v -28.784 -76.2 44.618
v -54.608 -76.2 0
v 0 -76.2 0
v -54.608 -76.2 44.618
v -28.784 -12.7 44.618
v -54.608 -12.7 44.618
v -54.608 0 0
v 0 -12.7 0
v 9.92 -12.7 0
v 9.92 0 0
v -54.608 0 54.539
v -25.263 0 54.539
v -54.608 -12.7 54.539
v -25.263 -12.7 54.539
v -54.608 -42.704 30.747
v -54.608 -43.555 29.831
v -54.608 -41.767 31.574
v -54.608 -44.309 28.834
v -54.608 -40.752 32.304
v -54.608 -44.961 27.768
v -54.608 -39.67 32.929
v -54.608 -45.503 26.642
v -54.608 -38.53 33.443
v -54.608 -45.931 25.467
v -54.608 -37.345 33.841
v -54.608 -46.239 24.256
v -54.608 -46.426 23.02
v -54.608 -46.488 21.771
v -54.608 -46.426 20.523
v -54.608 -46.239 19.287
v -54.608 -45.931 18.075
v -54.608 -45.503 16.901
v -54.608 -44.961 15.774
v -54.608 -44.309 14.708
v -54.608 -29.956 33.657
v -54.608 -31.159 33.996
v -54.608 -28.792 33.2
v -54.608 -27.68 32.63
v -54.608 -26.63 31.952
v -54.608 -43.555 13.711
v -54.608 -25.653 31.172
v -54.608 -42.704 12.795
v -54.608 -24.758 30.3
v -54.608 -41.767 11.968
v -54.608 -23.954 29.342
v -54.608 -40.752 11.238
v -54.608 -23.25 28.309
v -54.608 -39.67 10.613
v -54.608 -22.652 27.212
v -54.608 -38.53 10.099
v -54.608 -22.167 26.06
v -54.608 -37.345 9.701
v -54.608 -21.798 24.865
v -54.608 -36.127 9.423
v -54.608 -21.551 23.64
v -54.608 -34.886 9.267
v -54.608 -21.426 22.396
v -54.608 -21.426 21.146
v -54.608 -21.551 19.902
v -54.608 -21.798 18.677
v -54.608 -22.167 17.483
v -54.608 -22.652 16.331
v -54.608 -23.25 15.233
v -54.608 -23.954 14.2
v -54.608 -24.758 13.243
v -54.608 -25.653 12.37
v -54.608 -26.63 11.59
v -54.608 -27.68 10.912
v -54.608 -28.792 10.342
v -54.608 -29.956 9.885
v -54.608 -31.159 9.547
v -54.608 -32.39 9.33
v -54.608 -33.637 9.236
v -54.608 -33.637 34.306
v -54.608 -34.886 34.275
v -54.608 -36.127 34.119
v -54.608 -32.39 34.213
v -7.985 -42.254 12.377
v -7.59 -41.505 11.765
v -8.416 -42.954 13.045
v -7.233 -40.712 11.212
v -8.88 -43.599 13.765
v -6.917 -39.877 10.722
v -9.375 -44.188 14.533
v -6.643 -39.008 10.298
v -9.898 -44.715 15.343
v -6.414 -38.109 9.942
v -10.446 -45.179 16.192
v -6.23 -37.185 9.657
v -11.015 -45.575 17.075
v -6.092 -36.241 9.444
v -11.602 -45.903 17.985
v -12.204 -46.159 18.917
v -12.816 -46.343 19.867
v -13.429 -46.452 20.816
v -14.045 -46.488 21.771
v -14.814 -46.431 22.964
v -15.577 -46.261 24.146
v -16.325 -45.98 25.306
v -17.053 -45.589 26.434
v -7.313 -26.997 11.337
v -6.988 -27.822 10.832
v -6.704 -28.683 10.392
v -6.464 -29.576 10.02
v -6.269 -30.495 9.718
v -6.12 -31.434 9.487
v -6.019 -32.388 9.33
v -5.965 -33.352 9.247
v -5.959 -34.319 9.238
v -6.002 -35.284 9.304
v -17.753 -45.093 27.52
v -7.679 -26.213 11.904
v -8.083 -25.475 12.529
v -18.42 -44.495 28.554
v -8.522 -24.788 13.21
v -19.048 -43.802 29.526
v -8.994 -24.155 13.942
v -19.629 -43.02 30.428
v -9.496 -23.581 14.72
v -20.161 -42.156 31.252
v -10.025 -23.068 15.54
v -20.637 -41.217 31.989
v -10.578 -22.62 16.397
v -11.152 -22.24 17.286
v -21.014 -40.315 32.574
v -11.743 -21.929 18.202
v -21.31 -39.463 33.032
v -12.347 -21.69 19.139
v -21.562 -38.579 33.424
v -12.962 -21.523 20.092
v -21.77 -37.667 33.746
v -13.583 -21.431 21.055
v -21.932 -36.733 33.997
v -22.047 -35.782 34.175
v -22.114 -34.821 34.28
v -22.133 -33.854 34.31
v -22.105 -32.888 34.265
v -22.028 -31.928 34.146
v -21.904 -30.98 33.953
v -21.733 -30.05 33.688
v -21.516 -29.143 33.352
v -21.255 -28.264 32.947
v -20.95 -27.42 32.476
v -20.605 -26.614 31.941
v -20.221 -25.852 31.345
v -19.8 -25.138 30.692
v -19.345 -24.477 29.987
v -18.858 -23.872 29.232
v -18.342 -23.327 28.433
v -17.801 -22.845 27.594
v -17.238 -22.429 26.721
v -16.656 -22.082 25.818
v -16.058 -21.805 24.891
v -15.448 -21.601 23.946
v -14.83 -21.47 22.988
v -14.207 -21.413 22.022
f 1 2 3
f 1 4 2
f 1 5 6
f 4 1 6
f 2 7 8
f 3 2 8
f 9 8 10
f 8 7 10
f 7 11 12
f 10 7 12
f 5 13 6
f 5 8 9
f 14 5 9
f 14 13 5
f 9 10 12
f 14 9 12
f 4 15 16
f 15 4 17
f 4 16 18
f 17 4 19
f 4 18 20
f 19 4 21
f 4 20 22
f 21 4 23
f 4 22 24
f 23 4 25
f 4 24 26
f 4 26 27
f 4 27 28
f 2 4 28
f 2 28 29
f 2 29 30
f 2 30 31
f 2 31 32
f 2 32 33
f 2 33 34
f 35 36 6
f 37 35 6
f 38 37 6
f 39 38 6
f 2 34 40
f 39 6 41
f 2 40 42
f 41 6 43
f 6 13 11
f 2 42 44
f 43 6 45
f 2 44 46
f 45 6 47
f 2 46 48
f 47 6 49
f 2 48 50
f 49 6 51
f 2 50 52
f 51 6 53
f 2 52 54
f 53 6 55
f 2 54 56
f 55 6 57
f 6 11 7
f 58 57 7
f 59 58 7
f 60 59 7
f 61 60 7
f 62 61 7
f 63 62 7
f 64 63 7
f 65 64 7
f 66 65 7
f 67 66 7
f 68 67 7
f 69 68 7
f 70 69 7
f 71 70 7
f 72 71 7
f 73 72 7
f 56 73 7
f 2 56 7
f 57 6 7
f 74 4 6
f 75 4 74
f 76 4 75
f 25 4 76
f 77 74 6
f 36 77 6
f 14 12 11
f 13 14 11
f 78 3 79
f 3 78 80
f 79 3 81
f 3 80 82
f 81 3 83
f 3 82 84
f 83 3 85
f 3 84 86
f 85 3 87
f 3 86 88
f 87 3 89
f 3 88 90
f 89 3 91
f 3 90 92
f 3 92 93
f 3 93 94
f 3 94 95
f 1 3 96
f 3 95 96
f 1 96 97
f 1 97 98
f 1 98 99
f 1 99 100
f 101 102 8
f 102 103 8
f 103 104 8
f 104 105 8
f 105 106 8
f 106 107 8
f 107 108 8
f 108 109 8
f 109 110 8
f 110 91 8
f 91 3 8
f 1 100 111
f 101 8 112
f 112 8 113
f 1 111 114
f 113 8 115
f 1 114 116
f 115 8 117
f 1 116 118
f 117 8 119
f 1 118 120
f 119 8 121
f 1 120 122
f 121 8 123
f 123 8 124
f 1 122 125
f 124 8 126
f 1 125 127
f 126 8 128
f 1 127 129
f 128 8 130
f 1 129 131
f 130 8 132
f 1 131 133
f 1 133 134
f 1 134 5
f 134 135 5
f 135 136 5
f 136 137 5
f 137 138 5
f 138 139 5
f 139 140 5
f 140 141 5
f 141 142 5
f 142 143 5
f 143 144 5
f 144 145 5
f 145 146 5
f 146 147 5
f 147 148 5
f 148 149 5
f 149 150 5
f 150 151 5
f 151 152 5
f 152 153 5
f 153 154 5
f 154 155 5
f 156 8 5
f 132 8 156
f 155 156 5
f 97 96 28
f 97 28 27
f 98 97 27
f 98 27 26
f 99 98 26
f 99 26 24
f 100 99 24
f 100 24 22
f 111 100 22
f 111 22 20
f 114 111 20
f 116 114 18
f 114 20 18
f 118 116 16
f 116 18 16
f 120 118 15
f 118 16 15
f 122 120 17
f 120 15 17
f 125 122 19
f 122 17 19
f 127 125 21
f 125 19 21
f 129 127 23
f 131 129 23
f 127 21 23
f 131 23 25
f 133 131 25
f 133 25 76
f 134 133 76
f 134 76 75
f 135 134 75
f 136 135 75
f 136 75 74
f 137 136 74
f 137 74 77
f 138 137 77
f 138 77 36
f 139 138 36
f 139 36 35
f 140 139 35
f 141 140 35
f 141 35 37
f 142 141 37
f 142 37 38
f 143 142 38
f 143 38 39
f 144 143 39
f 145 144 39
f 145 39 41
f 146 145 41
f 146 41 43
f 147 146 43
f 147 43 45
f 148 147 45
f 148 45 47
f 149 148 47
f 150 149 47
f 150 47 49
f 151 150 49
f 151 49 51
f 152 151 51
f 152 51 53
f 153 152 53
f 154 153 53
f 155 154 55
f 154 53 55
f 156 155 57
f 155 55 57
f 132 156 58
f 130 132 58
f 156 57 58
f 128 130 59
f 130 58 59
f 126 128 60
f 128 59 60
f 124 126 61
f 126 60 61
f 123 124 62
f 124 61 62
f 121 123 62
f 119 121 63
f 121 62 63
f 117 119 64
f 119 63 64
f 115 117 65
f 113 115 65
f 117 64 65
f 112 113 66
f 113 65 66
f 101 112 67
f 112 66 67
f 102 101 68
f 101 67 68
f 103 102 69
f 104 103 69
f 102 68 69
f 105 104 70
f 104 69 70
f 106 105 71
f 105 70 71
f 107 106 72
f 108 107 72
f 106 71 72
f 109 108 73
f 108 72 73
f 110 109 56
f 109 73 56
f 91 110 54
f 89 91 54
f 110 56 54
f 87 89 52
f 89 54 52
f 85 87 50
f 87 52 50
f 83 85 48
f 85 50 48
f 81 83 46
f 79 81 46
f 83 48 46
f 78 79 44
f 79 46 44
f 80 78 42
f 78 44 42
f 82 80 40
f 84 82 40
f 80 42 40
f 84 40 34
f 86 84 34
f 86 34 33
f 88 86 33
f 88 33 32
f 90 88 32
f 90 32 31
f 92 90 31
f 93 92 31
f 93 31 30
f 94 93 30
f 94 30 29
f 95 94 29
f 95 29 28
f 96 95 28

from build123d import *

# Parameters (mm, degrees)
F2_DEPTH = 76.2
F3_R     = 12.538791
F4_DEPTH = 54.609487
F6_DEPTH = 12.7


with BuildPart() as f2:
    # F0 (on Front) → F2 (new body)
    with BuildSketch(Plane.XZ):
        Polygon((-54.608487, 0), (0, 0), (-28.783787, 44.618372), (-54.608487, 44.618372), align=None)
    extrude(amount=F2_DEPTH)

    # F3 (on face) → F4 (cut, through all)
    with BuildSketch(Plane(origin=(-54.608487, 0, 0), x_dir=(0, -1, 0), z_dir=(-1, 0, 0))):
        with Locations((33.949289, 21.771144)):
            Circle(F3_R)
    extrude(amount=-F4_DEPTH, mode=Mode.SUBTRACT)

    # F5 (on Front) → F6 (join)
    with BuildSketch(Plane.XZ):
        Polygon((-54.608487, 54.538789), (-54.608487, 44.618372), (-28.783787, 44.618372), (0, 0), (9.920417, 0), (-25.263137, 54.538789), align=None)
    extrude(amount=F6_DEPTH)


solid = f2.part
